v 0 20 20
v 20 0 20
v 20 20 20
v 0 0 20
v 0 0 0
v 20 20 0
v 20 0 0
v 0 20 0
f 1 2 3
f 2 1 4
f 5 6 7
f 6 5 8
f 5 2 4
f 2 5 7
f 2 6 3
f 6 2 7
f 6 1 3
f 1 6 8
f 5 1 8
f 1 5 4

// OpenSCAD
// Proves check_subfeature_overlap.py catches overlap BETWEEN two named
// sub-modules inside one part -- invisible to check_collisions.py, which only
// ever compares separately-exported STLs against each other. Once two
// sub-modules are union()-ed and exported as one part they no longer exist as
// distinguishable objects, and union() of two overlapping solids is still one
// valid watertight shell.
//
// Reproduction of INCIDENTS.md 2026-08-19: a bearing tower overlapped an
// unrelated motor-mounting cradle in the same part by 419mm3, invisible through
// several rounds of "all green" validation.
//
// This is the solo export of sub-module A (pre-union, same local coordinates).

$fa = 2; $fs = 0.3;

// EXPECTED_BBOX: [20, 20, 20]
cube([20, 20, 20]);
